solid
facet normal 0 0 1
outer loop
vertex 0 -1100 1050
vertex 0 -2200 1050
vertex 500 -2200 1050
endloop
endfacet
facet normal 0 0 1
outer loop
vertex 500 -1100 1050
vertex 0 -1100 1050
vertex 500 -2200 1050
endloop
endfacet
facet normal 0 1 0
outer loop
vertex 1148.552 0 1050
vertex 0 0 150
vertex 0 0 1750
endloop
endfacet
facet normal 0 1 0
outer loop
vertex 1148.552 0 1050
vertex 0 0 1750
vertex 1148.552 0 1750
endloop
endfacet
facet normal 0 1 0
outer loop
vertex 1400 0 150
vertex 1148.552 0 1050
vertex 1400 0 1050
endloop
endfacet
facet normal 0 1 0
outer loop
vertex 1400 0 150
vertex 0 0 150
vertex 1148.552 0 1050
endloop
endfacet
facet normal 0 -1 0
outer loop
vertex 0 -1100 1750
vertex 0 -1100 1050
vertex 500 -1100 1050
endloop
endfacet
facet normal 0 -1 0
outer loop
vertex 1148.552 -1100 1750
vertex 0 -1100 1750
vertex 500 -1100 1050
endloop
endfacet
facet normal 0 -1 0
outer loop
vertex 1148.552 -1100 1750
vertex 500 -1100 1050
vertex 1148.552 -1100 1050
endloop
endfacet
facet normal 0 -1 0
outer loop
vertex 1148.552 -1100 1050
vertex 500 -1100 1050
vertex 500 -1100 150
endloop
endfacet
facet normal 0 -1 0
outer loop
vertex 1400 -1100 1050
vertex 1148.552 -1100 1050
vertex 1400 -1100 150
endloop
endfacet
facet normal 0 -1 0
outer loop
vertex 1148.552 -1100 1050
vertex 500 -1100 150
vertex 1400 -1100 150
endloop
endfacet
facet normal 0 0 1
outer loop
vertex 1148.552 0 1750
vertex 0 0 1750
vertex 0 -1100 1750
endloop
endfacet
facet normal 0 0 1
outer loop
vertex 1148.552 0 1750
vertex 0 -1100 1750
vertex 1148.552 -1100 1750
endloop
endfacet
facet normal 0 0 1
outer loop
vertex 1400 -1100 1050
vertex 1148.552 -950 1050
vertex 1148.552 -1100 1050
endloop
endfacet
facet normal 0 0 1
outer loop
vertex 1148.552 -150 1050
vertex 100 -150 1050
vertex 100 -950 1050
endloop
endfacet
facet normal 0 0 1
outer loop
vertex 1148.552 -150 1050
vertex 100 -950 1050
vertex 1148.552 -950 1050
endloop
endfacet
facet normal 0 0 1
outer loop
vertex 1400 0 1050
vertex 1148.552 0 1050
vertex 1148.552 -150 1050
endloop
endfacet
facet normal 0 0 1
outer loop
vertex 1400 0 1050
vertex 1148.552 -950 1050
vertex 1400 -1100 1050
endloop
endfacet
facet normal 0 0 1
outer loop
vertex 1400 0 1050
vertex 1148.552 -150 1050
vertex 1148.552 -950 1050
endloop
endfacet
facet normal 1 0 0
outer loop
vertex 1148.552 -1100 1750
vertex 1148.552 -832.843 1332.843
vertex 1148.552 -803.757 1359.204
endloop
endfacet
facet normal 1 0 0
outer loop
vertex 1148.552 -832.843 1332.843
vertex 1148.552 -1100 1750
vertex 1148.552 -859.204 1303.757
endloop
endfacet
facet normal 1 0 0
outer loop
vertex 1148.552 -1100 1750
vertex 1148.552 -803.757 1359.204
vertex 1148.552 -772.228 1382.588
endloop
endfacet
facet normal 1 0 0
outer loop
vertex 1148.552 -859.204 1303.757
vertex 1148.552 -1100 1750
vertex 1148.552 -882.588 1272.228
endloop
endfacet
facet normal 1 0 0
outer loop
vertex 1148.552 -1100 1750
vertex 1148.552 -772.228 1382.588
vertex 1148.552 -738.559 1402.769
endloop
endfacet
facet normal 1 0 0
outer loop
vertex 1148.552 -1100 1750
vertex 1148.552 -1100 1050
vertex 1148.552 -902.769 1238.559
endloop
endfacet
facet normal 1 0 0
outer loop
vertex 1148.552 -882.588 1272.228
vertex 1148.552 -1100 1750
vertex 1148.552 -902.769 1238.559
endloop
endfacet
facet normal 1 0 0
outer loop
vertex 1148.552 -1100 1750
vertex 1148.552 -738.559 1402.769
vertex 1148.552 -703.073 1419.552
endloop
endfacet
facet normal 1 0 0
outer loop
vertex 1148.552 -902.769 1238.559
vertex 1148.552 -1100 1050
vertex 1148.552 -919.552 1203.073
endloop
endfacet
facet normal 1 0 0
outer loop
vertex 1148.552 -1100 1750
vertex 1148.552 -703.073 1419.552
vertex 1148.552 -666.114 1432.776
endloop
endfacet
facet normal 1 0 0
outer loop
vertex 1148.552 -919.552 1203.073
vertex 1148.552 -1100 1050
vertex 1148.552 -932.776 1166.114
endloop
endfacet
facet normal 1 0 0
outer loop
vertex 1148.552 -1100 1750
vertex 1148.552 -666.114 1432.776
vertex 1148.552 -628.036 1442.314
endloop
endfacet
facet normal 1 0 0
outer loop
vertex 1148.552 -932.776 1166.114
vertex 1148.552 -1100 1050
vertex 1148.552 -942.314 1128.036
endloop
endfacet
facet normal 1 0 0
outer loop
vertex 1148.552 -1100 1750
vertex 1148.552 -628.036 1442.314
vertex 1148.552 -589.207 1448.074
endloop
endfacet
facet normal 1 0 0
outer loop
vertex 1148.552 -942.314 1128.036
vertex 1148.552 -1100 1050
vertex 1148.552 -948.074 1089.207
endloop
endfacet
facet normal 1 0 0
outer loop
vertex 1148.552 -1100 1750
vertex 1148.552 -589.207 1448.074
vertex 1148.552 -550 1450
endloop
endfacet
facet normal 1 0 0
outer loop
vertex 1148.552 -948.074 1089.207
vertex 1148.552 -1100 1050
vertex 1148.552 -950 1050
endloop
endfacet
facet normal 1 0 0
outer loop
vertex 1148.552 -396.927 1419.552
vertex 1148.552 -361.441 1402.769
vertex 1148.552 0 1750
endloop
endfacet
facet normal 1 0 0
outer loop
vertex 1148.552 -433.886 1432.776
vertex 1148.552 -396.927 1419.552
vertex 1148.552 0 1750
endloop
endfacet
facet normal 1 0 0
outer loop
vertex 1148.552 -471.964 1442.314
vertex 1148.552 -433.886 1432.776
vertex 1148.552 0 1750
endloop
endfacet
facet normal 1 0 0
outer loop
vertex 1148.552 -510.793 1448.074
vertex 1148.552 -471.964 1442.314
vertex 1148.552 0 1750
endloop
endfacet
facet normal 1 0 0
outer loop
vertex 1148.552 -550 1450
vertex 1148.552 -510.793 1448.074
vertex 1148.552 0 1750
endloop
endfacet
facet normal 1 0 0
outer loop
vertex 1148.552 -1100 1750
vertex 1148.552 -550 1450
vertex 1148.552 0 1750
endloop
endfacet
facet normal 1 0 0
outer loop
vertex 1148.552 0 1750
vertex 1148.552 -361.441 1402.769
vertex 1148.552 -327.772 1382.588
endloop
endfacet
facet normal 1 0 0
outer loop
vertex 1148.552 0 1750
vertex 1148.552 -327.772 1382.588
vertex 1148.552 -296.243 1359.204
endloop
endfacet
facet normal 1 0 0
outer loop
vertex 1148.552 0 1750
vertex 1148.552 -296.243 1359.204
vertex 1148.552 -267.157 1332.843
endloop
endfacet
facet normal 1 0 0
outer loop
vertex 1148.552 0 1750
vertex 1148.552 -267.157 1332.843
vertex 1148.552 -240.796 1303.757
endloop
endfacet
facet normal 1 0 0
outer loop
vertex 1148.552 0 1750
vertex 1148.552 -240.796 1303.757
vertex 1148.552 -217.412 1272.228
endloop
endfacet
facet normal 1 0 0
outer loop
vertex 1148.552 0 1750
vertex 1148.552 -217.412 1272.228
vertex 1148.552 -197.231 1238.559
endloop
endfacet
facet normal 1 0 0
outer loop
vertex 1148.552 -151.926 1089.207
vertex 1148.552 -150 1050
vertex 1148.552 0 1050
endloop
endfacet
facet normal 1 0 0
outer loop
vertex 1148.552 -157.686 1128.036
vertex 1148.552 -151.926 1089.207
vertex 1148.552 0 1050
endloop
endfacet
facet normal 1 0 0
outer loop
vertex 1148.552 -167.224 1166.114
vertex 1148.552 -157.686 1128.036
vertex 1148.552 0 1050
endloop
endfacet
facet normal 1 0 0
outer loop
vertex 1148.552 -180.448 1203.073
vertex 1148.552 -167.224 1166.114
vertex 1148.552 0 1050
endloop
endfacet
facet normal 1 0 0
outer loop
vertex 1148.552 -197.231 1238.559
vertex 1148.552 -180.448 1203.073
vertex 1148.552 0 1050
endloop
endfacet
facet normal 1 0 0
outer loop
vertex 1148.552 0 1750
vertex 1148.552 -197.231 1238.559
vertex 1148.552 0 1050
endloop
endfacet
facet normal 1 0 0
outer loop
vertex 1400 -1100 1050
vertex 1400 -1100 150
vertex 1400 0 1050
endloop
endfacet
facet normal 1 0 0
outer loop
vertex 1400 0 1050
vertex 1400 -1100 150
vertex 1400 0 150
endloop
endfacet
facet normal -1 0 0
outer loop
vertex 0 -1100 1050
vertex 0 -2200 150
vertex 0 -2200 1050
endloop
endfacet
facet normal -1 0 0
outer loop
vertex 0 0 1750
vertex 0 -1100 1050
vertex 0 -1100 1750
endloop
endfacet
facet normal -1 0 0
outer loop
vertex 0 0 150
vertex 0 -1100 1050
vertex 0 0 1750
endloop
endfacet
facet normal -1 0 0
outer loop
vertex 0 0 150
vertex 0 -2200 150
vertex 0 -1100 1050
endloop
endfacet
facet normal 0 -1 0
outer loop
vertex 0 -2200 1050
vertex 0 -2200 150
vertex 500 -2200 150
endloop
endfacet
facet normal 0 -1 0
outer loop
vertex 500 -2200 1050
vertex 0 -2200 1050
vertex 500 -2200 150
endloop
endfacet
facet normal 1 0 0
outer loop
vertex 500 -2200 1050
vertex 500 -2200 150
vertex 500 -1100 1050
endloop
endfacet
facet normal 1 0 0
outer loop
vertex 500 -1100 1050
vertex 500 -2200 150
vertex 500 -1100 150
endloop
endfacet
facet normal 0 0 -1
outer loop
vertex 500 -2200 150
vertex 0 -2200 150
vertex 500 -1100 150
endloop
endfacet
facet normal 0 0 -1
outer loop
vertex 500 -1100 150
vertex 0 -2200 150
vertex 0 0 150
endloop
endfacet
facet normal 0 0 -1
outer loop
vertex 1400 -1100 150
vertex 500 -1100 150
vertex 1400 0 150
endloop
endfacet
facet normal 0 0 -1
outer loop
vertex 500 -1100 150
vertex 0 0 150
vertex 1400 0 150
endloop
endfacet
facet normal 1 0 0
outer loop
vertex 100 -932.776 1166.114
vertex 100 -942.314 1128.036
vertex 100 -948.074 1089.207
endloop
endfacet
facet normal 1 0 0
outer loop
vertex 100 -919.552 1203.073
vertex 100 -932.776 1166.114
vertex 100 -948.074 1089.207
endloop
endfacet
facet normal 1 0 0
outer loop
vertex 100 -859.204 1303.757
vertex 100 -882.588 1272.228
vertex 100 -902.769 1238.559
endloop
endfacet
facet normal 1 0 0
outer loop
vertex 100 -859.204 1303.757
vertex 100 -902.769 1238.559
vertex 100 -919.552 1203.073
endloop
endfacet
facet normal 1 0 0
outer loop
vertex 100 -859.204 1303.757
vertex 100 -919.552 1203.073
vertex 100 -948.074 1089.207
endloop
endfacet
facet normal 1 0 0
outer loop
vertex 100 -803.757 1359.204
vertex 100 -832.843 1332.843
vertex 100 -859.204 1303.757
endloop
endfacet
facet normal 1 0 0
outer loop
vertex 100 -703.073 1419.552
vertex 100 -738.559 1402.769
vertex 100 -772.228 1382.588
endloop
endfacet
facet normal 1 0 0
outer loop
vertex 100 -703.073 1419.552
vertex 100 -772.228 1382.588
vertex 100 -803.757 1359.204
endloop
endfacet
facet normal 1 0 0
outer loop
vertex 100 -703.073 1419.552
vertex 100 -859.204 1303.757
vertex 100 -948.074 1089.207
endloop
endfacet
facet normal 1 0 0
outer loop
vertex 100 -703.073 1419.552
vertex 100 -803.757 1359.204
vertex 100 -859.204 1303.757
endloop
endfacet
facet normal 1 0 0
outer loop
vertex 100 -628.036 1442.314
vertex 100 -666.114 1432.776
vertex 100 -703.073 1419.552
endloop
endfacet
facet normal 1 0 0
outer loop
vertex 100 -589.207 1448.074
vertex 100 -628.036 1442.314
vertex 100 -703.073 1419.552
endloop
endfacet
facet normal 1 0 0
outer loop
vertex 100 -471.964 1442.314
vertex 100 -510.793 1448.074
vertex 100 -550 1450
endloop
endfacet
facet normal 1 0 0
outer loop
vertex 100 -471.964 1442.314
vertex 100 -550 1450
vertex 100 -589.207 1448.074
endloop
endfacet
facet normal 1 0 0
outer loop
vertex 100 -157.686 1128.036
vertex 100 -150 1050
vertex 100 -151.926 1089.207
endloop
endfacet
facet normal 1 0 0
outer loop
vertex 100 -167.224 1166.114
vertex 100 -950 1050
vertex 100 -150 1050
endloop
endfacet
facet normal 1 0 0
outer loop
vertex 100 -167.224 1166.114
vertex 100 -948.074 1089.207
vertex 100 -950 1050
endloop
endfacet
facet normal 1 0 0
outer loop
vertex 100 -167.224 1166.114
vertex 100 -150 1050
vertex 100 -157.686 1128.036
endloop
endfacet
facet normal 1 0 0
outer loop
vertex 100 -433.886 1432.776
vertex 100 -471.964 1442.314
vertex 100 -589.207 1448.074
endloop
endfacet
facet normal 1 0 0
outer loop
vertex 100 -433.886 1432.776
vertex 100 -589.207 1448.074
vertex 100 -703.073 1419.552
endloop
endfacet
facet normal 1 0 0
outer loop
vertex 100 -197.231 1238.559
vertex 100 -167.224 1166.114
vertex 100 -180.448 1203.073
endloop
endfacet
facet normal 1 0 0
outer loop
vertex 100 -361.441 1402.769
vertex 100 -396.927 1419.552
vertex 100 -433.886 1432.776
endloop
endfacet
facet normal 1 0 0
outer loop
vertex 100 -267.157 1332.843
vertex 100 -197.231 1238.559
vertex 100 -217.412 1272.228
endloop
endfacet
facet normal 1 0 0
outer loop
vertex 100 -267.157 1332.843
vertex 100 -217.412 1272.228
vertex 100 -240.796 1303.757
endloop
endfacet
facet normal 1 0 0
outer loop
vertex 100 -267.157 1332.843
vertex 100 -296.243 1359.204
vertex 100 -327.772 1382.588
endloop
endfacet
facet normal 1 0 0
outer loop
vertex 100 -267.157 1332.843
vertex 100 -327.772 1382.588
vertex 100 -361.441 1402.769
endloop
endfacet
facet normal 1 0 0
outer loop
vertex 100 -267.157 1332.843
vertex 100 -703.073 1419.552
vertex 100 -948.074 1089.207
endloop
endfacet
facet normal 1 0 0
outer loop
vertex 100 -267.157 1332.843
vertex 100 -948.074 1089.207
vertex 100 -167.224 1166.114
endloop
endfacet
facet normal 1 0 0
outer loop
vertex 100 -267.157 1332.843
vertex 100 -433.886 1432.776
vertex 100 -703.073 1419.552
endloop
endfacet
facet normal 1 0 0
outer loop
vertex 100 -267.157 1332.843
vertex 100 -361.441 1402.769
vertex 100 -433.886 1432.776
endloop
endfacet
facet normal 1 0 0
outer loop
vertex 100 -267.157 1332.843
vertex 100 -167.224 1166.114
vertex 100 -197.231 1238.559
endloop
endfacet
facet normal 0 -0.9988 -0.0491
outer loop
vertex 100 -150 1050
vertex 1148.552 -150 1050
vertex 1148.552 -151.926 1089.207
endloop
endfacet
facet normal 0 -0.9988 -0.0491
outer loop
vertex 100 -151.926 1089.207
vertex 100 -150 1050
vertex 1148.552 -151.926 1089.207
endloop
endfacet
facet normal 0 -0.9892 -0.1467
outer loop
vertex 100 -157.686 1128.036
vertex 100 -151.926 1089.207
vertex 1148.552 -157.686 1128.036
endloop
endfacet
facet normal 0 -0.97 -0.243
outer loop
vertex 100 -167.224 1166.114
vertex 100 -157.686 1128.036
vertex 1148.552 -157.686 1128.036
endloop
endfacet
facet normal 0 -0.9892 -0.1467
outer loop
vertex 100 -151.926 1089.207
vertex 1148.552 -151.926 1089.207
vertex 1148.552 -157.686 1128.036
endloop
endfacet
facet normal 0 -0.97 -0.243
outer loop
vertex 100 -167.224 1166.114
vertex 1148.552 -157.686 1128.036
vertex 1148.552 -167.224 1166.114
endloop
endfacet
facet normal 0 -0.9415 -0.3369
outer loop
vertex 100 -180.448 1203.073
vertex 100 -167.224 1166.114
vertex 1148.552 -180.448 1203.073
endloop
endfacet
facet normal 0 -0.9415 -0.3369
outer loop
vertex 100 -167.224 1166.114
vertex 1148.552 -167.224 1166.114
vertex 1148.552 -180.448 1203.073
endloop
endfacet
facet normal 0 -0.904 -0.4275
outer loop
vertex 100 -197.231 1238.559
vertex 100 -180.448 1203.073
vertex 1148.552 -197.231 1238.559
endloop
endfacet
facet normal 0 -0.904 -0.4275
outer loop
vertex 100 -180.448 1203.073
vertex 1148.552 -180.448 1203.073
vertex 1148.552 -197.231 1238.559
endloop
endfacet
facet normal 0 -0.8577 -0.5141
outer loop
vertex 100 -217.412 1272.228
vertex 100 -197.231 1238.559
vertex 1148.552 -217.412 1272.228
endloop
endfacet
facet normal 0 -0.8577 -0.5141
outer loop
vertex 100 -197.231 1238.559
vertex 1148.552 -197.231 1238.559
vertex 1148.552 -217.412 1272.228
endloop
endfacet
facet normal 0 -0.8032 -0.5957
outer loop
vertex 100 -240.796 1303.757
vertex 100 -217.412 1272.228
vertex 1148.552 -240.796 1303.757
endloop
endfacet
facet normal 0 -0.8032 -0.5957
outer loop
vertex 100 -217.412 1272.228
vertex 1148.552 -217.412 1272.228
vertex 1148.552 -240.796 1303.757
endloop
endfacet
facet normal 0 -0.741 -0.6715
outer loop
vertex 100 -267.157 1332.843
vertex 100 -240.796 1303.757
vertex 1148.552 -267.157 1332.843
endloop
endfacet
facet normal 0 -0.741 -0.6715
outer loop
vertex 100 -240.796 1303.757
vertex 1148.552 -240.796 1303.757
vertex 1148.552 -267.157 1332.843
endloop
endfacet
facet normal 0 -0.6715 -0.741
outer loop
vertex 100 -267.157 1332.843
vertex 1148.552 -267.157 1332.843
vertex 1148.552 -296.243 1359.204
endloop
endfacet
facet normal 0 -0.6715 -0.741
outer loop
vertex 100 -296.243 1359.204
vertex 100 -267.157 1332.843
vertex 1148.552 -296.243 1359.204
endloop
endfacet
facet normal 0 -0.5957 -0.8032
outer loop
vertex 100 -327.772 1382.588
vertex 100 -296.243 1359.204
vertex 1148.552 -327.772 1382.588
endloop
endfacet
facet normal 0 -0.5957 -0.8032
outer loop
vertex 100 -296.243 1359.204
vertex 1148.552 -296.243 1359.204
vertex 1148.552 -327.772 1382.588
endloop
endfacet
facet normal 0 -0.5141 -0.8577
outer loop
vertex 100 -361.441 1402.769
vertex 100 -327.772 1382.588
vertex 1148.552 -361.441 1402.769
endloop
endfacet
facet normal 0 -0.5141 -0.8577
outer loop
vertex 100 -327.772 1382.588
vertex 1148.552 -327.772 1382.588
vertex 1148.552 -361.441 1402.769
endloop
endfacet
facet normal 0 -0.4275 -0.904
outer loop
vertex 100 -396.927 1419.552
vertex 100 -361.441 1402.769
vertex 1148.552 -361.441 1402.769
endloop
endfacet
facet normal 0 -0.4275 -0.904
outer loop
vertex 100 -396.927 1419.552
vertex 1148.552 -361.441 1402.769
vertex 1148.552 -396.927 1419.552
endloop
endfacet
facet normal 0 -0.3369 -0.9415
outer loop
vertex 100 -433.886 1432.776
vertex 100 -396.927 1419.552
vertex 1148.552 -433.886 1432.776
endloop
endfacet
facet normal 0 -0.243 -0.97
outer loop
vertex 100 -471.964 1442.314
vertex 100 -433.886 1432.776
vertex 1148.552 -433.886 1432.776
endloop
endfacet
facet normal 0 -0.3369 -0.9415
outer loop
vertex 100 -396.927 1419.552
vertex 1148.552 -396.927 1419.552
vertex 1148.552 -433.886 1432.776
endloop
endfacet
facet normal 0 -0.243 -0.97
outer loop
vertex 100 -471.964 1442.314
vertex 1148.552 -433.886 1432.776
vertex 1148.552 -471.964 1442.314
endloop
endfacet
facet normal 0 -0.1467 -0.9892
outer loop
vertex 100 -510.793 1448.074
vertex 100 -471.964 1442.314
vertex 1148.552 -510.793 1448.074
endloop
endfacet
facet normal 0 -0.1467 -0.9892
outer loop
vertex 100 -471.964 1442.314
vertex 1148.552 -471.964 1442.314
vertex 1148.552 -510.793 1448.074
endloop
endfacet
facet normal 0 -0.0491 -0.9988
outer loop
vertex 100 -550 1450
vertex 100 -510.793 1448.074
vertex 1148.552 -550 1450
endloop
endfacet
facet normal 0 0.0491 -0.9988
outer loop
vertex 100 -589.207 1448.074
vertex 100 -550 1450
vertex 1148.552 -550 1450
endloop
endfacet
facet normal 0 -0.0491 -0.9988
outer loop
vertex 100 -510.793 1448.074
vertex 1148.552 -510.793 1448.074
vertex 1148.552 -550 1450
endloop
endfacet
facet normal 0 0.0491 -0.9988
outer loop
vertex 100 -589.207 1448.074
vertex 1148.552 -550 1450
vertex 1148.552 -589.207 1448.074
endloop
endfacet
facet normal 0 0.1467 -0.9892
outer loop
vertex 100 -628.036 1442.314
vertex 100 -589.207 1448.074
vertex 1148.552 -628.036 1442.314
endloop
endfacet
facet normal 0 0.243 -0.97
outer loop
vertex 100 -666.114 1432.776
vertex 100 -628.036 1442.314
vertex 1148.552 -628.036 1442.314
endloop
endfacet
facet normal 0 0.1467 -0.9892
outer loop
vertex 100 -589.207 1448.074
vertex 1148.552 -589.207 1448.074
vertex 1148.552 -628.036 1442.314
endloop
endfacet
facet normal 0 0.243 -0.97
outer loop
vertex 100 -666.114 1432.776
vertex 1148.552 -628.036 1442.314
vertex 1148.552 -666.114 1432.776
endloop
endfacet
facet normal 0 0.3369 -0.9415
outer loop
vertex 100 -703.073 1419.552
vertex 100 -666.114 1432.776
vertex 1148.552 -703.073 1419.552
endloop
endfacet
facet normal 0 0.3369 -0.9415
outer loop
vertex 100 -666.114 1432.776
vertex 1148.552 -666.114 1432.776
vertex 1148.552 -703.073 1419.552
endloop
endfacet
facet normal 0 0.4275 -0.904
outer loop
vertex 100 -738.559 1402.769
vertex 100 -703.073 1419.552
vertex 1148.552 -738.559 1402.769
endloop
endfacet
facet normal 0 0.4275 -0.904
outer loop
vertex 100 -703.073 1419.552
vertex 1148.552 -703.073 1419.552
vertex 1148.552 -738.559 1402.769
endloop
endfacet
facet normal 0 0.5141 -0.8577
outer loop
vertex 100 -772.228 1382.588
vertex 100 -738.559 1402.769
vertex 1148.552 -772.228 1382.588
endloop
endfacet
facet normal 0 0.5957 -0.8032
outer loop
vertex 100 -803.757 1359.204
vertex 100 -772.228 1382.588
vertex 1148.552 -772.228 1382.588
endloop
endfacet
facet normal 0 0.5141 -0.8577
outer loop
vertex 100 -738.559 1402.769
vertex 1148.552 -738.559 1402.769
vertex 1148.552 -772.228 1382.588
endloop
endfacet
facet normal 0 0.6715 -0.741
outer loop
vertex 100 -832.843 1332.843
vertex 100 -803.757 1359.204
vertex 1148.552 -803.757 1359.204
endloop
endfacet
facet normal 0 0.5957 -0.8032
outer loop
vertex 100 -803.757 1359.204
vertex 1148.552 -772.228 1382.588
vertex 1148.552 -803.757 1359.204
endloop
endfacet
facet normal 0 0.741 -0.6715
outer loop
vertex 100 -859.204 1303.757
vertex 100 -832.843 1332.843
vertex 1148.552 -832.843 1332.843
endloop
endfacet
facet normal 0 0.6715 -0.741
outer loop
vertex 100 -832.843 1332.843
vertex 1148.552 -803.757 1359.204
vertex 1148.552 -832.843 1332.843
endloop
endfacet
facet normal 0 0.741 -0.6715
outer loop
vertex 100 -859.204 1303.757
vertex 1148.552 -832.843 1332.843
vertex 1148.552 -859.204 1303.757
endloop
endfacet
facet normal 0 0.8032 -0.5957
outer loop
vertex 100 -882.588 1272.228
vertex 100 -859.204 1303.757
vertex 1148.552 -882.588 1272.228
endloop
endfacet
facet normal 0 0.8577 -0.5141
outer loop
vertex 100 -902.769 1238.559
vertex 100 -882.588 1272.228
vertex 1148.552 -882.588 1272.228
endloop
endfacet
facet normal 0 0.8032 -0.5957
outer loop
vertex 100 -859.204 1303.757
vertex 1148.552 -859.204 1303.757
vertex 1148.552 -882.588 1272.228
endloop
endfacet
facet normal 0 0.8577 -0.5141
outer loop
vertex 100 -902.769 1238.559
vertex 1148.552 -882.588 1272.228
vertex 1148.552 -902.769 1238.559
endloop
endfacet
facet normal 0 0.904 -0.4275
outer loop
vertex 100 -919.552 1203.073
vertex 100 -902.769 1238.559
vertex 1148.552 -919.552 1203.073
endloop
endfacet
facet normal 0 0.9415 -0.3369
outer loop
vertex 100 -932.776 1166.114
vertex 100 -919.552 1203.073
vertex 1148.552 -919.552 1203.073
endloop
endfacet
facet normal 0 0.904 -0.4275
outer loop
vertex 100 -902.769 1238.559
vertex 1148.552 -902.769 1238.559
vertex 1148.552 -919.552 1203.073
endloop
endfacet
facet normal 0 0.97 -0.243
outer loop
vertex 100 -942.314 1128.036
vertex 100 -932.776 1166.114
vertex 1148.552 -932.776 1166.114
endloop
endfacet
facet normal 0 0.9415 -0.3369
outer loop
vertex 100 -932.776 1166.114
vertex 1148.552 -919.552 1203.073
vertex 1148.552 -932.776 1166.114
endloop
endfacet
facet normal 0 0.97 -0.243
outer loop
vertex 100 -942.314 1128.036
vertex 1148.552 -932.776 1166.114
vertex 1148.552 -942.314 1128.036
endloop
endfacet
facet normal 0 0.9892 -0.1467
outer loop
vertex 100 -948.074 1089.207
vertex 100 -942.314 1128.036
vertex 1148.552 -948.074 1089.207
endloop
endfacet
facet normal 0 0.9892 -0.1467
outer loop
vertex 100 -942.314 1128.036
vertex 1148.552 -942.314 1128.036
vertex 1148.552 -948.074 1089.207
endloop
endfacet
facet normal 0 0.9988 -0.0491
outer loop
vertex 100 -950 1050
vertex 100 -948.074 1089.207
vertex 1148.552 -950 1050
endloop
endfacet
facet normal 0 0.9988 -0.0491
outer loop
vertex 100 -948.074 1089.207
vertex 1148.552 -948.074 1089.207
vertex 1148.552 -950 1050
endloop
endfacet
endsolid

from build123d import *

# Parameters (mm, degrees)
F2_DEPTH = 900
F4_W     = 1148.5522985458
F4_H     = 1100
F5_DEPTH = 700
F8_DEPTH = 1048.5522985458


with BuildPart() as f2:
    # F1 (on offset) → F2 (new body)
    with BuildSketch(Plane.XY.offset(150)):
        Polygon((1400, 0), (0, 0), (0, -2200), (500, -2200), (500, -1100), (1400, -1100), align=None)
    extrude(amount=F2_DEPTH)

    # F4 (on offset) → F5 (join)
    with BuildSketch(Plane.XY.offset(1050)):
        with Locations((574.2761492729, -550)):
            Rectangle(F4_W, F4_H)
    extrude(amount=F5_DEPTH)

    # F7 (on face) → F8 (cut, through all)
    with BuildSketch(Plane.YZ.offset(1148.5522985458)):
        with BuildLine():
            Line((-950, 1050), (-150, 1050))
            ThreePointArc((-150, 1050), (-550, 1450), (-950, 1050))
        make_face()
    extrude(amount=-F8_DEPTH, mode=Mode.SUBTRACT)


solid = f2.part
